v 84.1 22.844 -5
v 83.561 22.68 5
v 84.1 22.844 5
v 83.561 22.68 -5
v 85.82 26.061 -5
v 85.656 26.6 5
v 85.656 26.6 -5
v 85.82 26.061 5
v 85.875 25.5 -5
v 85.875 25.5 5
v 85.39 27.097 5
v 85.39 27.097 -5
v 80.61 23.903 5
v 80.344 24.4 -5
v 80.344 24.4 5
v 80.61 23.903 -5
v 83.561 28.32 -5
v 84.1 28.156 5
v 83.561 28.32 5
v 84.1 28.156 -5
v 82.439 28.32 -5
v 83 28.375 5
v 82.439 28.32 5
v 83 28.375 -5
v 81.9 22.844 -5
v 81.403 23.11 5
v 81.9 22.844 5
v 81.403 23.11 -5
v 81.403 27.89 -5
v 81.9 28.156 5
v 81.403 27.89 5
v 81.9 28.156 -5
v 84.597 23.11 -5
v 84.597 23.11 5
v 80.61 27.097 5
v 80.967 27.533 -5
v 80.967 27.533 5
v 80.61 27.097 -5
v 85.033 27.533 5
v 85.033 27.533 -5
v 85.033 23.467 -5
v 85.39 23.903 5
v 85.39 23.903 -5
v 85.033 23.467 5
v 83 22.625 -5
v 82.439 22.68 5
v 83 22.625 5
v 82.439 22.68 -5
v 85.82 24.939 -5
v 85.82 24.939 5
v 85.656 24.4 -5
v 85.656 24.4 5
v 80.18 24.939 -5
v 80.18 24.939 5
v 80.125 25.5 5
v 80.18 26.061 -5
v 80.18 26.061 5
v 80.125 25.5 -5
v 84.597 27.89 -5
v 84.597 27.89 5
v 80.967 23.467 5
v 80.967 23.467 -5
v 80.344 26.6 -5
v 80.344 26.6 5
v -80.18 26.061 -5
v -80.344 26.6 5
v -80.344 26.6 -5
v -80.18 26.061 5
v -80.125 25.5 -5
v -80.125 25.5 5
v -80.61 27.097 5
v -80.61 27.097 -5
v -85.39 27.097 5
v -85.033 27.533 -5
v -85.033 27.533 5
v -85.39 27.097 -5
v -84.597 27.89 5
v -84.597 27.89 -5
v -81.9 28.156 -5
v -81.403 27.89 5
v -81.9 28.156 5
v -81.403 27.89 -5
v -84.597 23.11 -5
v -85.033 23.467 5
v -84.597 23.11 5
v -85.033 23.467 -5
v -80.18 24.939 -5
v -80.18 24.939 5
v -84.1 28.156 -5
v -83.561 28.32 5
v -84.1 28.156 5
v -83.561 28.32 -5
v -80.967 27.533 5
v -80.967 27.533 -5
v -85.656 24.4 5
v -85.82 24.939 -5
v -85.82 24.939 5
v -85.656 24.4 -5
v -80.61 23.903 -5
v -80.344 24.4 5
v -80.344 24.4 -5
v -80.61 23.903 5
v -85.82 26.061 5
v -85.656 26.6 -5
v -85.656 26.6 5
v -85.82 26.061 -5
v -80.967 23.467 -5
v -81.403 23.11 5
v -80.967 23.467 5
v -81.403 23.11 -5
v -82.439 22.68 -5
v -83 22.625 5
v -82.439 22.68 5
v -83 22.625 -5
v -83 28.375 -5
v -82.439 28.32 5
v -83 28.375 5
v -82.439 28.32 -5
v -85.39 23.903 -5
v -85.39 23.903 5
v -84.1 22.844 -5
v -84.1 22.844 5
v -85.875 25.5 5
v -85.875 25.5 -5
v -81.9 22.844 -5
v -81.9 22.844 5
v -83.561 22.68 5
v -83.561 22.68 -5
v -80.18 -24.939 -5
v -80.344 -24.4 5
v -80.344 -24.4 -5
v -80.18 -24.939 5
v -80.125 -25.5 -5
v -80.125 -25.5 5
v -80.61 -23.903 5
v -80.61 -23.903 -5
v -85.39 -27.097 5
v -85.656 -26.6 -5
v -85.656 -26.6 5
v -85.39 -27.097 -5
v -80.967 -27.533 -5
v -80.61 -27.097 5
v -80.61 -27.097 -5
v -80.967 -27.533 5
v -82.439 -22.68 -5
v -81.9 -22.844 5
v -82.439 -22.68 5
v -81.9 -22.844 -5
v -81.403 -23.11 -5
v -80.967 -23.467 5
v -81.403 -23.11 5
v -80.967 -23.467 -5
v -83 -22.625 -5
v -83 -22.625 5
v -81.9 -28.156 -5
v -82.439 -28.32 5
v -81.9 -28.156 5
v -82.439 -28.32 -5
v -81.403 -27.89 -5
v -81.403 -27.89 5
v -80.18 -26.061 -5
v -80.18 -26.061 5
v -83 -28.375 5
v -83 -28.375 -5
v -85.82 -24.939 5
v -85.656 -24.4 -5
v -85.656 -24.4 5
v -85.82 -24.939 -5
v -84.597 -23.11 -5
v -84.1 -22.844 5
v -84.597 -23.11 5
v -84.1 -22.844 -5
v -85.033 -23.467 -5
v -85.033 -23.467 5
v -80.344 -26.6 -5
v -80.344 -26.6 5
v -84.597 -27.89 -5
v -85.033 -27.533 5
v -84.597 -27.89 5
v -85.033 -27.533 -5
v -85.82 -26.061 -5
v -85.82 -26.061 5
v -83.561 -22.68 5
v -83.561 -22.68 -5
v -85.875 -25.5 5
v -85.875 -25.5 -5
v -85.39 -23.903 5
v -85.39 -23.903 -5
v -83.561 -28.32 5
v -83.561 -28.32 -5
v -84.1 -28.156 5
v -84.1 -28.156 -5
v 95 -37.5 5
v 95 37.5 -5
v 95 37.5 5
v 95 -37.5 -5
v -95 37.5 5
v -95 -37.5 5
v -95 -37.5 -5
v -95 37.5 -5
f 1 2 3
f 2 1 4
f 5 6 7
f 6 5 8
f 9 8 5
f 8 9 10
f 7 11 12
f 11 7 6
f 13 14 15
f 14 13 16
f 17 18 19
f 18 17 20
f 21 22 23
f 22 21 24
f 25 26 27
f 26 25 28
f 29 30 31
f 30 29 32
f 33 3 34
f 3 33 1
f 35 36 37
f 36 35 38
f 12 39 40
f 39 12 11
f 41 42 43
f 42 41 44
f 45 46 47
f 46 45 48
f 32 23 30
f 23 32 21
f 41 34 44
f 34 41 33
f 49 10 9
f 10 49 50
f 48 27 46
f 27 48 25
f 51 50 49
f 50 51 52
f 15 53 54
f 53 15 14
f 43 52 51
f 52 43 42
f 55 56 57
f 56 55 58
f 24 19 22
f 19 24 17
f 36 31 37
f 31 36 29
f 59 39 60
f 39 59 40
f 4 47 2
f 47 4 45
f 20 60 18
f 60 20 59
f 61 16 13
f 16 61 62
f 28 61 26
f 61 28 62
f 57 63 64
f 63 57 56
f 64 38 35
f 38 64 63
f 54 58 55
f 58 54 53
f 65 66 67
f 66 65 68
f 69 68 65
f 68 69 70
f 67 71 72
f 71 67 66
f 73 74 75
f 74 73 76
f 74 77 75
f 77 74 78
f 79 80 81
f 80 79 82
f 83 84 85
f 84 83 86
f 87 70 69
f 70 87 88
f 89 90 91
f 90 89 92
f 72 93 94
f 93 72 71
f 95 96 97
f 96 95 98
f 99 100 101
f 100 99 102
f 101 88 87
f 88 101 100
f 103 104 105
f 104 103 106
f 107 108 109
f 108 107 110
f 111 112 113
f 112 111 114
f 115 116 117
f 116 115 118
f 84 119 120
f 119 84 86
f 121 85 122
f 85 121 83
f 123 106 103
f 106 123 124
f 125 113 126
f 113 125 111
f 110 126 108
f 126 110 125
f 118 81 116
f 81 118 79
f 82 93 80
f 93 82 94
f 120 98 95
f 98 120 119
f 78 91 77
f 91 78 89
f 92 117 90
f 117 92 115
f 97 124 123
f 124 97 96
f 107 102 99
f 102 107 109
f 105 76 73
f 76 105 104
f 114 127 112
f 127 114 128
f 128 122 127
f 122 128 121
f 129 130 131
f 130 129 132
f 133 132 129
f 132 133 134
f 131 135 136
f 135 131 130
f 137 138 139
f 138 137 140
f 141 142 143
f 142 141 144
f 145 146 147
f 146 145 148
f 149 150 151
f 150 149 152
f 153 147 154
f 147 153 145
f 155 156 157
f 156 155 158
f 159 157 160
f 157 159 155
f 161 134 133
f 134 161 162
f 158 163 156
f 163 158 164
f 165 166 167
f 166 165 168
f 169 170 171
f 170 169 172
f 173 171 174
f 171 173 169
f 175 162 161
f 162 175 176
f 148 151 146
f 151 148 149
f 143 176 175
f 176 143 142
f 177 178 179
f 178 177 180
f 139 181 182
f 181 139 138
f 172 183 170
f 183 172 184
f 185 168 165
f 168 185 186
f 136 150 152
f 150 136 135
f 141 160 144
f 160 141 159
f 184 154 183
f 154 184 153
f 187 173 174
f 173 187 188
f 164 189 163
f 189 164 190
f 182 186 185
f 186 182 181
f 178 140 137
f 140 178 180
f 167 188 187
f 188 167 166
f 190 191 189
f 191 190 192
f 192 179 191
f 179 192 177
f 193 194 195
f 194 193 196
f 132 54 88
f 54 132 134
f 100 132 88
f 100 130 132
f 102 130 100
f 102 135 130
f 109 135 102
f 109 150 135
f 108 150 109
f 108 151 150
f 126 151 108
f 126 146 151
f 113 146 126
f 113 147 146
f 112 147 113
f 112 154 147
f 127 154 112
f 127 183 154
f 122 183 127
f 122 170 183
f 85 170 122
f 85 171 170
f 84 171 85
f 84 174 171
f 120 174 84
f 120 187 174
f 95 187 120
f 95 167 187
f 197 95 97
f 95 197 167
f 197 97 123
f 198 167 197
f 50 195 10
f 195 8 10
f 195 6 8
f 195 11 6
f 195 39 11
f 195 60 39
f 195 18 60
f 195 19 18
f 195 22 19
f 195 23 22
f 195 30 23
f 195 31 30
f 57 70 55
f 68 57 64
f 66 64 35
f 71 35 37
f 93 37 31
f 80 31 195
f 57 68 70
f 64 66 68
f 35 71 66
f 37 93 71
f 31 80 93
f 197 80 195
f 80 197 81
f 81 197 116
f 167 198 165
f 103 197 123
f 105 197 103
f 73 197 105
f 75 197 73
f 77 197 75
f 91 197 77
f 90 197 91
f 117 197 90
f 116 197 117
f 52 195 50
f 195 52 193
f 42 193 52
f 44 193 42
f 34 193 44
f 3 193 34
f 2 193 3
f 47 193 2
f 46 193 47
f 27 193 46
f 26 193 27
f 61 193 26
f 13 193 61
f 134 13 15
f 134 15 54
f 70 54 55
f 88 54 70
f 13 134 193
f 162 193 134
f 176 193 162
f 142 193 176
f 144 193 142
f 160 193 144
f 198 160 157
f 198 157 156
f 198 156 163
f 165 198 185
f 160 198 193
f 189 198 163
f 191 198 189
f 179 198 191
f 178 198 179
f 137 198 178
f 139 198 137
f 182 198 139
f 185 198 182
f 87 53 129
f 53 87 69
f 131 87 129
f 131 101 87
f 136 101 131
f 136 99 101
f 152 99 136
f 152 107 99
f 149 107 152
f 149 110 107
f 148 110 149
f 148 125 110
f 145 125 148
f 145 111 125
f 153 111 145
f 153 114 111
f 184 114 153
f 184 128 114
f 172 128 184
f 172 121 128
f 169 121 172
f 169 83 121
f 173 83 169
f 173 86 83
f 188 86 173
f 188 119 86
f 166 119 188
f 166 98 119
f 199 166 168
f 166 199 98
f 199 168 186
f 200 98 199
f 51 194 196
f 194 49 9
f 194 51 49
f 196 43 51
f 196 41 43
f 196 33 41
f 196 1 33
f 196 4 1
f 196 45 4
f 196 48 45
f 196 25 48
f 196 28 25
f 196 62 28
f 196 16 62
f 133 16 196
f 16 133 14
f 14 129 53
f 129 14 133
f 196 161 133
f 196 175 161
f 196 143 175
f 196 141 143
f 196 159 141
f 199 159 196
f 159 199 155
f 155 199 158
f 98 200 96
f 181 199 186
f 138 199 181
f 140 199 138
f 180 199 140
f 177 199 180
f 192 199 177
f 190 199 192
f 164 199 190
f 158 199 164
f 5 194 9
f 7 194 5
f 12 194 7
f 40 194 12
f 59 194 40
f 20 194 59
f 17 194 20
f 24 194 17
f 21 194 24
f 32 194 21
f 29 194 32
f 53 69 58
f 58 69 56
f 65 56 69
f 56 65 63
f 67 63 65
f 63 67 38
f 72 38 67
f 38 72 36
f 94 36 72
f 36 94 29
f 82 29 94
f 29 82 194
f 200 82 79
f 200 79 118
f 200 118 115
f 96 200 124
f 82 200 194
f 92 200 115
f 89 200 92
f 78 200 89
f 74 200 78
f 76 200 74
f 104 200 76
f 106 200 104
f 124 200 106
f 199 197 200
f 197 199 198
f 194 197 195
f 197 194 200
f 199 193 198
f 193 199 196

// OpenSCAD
$fn = 32;

// ----------------------------------------------------------------------
// Corner plate 190 x 75 x 10
// 3 holes, centres taken from the edge offset
// ----------------------------------------------------------------------

// --- parameters (mm) ---
plate = [190, 75, 10];   // overall size (x, y, z)
holes = 3;               // number of holes the drawing asks for
bore_d = 5.5;            // nominal hole diameter from the drawing
print_allowance = 0.25;  // clearance added for printing
edge = 12;               // hole centre offset from the plate edge

// --- derived feature positions (mm) ---
hole_d = bore_d + print_allowance;  // = 5.75   hole diameter as printed
corner_x = plate[0] / 2 - edge;     // = 83   corner hole X
corner_y = plate[1] / 2 - edge;     // = 25.5   corner hole Y
feature_centers = [
  [corner_x, corner_y],
  [-corner_x, corner_y],
  [-corner_x, -corner_y]
];   // hole centres the loop below drills

// plate outline, every hole drilled through with the same cutters
difference() {
  cube(plate, center = true);
  for (centre = feature_centers)
    translate([centre[0], centre[1], 0])
      cylinder(d = hole_d, h = plate[2] + 2, center = true);
}
